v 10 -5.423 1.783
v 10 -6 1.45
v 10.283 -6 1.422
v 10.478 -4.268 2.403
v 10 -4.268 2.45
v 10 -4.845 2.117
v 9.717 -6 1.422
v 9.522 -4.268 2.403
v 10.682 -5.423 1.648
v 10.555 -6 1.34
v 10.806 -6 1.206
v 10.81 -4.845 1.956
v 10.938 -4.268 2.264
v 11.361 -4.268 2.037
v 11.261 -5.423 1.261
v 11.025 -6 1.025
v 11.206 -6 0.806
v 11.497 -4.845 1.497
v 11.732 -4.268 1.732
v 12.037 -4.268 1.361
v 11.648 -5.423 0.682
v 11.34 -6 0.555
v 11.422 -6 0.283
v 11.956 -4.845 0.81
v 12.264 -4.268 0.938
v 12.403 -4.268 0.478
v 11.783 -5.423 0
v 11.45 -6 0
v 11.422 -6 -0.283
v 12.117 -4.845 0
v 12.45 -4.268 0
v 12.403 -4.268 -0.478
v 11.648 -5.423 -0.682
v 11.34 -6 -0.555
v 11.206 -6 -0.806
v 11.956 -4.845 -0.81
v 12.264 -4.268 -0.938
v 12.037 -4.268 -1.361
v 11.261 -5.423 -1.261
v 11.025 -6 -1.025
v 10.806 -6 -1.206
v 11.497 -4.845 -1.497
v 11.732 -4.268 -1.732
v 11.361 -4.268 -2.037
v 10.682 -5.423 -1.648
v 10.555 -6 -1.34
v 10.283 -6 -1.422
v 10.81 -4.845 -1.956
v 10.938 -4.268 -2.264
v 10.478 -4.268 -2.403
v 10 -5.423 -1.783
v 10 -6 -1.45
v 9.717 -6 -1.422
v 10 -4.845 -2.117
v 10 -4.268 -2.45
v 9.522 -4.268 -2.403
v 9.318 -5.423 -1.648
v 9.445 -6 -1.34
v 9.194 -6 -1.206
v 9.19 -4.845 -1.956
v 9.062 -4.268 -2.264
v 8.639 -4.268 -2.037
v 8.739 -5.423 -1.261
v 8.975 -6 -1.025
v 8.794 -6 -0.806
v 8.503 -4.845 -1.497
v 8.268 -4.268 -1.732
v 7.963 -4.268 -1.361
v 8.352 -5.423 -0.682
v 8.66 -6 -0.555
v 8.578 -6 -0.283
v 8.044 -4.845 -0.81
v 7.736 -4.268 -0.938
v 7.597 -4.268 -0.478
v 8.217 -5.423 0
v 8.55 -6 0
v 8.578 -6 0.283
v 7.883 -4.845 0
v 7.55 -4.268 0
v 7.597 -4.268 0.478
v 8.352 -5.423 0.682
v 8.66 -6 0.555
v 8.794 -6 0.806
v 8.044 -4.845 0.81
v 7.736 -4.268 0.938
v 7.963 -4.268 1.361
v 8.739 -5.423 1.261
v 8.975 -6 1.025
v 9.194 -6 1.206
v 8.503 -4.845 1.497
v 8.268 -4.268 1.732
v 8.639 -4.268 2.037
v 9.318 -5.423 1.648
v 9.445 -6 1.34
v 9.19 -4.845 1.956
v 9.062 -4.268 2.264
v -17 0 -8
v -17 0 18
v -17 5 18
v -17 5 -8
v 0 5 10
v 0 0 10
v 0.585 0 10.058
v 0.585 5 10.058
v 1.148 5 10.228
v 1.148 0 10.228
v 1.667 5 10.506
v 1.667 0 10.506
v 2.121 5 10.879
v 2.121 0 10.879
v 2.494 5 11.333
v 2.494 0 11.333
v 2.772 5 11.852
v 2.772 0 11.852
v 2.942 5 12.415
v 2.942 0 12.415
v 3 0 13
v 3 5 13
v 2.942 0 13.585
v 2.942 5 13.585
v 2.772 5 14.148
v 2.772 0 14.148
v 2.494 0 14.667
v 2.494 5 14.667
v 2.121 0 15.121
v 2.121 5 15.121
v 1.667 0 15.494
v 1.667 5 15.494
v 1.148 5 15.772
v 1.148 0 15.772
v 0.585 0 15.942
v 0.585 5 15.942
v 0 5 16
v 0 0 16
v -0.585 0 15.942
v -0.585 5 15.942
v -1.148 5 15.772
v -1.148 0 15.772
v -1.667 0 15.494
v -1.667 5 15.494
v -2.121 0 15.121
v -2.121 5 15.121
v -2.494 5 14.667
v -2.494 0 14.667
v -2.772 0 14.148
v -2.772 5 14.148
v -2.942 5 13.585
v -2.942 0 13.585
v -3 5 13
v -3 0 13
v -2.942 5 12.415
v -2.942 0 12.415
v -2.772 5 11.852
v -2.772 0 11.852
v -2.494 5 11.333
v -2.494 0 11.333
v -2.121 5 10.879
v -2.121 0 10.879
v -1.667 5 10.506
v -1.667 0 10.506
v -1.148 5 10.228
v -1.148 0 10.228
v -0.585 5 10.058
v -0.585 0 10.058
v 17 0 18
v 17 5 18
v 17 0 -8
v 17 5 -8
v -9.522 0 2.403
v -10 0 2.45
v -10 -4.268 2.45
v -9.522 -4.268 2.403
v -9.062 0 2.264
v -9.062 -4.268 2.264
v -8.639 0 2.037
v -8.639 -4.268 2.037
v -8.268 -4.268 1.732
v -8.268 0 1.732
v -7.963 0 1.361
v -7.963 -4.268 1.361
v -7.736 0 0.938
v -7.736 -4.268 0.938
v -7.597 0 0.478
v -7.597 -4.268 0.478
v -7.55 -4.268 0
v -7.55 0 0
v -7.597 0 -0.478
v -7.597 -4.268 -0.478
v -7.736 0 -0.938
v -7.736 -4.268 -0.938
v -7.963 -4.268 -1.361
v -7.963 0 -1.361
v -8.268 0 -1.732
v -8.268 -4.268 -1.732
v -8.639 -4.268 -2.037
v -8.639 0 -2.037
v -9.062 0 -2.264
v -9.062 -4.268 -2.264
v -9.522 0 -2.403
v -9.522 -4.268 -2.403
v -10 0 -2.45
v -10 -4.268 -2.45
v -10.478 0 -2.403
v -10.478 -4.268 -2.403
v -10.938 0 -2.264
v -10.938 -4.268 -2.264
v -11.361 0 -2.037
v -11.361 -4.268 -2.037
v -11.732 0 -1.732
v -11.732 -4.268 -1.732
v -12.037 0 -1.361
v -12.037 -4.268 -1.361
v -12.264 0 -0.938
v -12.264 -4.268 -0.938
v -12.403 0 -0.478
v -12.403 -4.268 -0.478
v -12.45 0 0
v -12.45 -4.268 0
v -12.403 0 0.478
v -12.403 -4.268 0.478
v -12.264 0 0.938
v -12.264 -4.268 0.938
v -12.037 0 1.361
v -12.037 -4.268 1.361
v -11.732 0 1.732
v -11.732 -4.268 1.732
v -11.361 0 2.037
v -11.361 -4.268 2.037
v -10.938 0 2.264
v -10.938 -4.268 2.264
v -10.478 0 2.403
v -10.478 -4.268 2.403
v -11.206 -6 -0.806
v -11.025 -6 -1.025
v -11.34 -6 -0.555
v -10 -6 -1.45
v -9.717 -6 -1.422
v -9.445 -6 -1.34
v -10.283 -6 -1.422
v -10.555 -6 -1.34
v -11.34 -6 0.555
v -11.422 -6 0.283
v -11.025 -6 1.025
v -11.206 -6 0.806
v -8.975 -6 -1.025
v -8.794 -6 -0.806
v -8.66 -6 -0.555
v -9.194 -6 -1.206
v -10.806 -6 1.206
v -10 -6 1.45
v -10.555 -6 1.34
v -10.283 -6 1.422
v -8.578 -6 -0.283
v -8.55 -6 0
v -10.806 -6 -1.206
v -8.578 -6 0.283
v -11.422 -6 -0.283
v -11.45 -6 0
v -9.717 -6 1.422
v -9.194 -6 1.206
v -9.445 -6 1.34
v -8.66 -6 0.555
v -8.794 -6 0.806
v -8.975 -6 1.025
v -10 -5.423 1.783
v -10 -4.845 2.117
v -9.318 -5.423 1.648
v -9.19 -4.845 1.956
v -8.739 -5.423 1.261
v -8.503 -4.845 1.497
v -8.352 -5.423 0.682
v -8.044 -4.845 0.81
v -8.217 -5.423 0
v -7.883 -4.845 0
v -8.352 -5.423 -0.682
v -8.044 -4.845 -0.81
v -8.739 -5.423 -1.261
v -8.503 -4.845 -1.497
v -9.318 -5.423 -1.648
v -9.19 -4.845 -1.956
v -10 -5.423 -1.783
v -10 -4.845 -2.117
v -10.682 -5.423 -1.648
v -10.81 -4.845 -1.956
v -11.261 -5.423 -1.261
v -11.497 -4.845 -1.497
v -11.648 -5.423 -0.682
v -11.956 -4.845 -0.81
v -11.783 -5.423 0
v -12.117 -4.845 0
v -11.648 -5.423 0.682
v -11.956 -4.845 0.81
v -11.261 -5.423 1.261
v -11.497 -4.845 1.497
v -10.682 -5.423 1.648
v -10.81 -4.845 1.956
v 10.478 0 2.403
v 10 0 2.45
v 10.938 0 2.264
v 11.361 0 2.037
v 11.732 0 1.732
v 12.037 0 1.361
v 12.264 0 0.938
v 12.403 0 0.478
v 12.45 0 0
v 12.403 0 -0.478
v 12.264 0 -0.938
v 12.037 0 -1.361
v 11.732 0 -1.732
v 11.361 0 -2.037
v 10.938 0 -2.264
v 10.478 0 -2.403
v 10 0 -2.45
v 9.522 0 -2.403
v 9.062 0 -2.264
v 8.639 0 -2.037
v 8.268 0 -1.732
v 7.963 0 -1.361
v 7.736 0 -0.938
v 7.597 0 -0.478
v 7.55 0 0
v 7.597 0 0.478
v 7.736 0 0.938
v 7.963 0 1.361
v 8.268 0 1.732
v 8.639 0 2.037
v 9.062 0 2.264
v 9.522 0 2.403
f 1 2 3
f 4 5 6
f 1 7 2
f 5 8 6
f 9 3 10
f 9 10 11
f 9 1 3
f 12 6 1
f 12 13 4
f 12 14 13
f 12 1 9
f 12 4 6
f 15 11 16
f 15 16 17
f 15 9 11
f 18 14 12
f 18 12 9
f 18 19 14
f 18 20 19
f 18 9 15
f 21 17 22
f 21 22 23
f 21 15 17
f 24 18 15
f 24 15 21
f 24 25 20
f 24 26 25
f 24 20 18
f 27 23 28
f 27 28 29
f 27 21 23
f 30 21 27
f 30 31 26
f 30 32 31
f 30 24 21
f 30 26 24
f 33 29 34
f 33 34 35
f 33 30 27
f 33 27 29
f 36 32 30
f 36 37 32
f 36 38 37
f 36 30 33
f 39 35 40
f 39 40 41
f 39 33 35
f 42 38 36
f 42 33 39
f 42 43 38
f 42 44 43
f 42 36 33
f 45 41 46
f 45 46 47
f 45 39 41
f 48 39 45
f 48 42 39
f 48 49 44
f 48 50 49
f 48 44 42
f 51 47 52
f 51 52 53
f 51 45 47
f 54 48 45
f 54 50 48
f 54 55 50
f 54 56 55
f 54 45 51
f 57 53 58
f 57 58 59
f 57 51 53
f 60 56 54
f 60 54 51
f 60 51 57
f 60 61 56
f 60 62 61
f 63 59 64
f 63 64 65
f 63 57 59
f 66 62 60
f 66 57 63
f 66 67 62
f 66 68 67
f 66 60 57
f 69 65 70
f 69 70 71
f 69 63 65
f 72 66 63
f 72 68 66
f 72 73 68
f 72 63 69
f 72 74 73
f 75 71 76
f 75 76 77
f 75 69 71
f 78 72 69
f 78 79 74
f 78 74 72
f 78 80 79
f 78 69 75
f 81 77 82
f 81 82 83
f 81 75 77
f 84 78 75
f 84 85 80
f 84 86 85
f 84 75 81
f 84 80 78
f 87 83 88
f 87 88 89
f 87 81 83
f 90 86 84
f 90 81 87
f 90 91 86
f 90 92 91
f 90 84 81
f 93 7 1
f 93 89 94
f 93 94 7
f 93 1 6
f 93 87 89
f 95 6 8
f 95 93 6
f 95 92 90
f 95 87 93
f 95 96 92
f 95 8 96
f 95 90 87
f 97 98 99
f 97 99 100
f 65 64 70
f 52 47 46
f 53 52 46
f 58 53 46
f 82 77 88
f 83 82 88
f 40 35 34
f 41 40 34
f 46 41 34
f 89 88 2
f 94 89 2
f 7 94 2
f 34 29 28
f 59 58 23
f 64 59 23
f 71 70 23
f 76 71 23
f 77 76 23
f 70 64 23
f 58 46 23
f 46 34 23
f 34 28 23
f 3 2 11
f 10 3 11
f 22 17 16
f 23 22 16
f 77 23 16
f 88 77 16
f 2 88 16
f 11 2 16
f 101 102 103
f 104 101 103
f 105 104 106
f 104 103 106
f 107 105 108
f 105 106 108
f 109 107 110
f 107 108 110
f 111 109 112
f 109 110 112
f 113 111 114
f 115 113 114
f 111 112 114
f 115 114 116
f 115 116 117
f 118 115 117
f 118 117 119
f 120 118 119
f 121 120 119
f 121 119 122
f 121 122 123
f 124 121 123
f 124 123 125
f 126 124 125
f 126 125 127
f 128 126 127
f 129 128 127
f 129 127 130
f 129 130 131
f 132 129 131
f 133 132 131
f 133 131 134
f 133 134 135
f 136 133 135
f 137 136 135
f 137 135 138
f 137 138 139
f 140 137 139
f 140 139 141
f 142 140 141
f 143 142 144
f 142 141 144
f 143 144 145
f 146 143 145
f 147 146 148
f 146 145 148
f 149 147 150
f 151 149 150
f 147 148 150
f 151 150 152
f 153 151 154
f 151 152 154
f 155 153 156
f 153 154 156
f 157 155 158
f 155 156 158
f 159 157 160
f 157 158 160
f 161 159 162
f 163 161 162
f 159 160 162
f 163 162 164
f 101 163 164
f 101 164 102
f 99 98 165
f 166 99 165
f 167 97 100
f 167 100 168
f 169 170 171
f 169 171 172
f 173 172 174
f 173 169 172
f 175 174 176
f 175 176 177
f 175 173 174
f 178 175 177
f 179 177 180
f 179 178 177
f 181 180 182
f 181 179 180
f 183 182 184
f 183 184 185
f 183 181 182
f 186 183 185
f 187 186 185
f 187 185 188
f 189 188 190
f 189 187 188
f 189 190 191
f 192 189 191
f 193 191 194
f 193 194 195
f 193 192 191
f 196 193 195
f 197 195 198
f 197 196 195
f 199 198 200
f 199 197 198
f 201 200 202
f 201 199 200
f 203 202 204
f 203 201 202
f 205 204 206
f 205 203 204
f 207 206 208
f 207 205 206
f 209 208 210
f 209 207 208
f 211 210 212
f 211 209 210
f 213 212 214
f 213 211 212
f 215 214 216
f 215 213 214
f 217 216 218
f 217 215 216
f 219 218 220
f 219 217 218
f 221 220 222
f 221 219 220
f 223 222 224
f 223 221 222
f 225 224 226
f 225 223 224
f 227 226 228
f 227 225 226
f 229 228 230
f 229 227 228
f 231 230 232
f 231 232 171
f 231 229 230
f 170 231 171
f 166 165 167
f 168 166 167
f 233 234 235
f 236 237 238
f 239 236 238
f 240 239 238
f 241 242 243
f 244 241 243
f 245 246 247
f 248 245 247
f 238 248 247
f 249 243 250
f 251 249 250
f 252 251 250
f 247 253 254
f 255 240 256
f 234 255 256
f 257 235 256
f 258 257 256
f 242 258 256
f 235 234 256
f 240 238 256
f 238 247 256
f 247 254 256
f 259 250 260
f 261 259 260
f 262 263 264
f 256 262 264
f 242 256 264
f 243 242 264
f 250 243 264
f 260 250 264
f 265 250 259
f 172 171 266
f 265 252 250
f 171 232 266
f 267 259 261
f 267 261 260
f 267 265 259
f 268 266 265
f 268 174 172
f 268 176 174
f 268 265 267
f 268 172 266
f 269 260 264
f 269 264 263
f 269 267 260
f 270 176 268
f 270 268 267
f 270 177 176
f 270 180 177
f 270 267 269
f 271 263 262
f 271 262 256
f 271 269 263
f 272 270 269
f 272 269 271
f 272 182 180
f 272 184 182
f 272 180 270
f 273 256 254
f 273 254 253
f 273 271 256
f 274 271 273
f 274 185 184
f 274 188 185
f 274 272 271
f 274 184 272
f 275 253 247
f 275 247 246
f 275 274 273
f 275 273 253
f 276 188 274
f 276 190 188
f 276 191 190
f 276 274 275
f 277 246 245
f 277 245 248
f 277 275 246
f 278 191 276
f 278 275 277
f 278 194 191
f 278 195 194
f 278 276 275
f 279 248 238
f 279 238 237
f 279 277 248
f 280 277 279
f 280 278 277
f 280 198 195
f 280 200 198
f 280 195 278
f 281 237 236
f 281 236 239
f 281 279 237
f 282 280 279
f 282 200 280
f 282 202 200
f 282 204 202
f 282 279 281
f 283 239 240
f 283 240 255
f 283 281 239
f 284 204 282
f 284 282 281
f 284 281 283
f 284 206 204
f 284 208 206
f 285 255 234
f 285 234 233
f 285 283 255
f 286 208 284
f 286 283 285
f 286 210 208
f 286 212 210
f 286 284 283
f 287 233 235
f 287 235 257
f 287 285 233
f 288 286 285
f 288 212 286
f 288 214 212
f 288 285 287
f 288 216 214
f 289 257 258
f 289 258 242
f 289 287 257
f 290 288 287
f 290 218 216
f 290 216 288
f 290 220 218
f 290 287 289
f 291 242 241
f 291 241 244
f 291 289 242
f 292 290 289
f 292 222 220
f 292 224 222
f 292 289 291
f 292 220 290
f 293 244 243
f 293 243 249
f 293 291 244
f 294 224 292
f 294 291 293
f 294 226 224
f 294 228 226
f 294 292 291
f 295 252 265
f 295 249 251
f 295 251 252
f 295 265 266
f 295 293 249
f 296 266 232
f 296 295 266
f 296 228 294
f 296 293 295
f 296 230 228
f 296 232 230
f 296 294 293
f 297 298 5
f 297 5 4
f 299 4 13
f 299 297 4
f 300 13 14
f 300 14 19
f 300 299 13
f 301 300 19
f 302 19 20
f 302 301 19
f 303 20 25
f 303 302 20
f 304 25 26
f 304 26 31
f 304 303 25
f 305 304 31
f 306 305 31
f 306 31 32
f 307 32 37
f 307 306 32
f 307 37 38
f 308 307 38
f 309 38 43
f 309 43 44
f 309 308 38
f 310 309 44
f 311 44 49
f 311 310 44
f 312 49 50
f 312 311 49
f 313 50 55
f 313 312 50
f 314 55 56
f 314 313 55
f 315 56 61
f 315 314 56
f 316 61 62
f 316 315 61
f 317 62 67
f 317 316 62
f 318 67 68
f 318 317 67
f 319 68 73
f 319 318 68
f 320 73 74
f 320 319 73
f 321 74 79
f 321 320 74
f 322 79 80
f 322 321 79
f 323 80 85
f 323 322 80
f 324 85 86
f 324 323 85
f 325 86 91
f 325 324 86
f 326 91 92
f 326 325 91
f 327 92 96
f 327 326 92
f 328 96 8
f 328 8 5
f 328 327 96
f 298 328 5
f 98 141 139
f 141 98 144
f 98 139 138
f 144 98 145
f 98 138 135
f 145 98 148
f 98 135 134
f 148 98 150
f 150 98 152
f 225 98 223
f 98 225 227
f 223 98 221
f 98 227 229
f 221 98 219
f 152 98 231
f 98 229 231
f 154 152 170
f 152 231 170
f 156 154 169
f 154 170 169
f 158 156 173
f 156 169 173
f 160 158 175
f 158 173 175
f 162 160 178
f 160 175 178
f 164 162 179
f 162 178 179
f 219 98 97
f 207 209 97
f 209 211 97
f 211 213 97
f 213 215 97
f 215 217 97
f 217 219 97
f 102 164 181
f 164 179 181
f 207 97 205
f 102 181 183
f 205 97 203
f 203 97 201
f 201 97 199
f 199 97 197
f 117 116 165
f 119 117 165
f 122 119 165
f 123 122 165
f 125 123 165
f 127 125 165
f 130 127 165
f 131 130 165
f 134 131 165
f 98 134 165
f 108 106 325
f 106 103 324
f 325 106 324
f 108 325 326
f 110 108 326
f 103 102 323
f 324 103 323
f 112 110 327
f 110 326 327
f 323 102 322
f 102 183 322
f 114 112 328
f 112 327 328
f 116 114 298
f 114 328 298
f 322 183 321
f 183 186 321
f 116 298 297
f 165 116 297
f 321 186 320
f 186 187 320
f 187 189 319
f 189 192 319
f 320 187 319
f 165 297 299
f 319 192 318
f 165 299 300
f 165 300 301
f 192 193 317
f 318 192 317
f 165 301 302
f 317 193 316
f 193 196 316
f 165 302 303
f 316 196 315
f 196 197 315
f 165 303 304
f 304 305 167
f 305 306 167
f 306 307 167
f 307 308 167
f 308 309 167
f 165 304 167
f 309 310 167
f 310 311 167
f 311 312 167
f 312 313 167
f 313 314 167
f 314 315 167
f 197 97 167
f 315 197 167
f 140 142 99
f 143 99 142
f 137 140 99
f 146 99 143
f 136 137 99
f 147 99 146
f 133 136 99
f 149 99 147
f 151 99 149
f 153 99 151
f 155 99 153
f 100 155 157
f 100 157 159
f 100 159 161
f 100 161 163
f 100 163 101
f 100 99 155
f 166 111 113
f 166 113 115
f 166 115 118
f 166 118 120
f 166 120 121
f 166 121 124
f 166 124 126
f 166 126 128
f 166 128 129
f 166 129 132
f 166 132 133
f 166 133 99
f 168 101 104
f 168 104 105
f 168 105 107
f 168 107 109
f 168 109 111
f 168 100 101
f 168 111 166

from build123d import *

# Parameters (mm, degrees)
SKETCH1_R             = 2.45
BOSS_EXTRUDE1_DEPTH   = 6
BOSS_EXTRUDE1_2_DEPTH = 6
CHAMFER1_SIZE         = 1
CHAMFER1_SIZE2        = 1.732050808
CHAMFER2_SIZE         = 1
CHAMFER2_SIZE2        = 1.732050808
SKETCH3_W             = 34
SKETCH3_H             = 26
BOSS_EXTRUDE2_DEPTH   = 5
SKETCH6_R             = 3
CUT_EXTRUDE2_DEPTH    = 26.475478406


with BuildPart() as part:
    # Sketch1 → Boss-Extrude1 (new body)
    with BuildSketch(Plane(origin=(0, 0, 0), x_dir=(1, 0, 0), z_dir=(0, 1, 0))):
        with Locations(Location((-10, 0, 0), (0, 0, 270))):
            Circle(SKETCH1_R)
    extrude(amount=-BOSS_EXTRUDE1_DEPTH)

    # Chamfer2
    chamfer2_edges = [part.edges().sort_by_distance(p)[0] for p in [
        (-10, -6, -2.45),
    ]]
    chamfer2_side = [part.faces().sort_by_distance(p)[0] for p in [
        (-10, -6, 0),
    ]]
    chamfer(chamfer2_edges, length=CHAMFER2_SIZE, length2=CHAMFER2_SIZE2, reference=chamfer2_side[0])



with BuildPart() as body_2:
    # Sketch1 → Boss-Extrude1 2 (new body)
    with BuildSketch(Plane(origin=(0, 0, 0), x_dir=(1, 0, 0), z_dir=(0, 1, 0))):
        with Locations(Location((10, 0, 0), (0, 0, 270))):
            Circle(SKETCH1_R)
    extrude(amount=-BOSS_EXTRUDE1_2_DEPTH)

    # Chamfer1
    chamfer1_edges = [body_2.edges().sort_by_distance(p)[0] for p in [
        (10, -6, -2.45),
    ]]
    chamfer1_side = [body_2.faces().sort_by_distance(p)[0] for p in [
        (10, -6, 0),
    ]]
    chamfer(chamfer1_edges, length=CHAMFER1_SIZE, length2=CHAMFER1_SIZE2, reference=chamfer1_side[0])


with BuildPart() as part_1:
    add(part.part)

    add(body_2.part)  # Boss-Extrude2 merges body 2
    # Sketch3 → Boss-Extrude2 (add)
    with BuildSketch(Plane(origin=(0, 0, 0), x_dir=(1, 0, 0), z_dir=(0, 1, 0))):
        with Locations((0, -5)):
            Rectangle(SKETCH3_W, SKETCH3_H)
    extrude(amount=BOSS_EXTRUDE2_DEPTH)

    # Sketch6 → Cut-Extrude2 (cut, through all)
    with BuildSketch(Plane.XZ):
        with Locations(Location((0, 13, 0), (0, 0, 270))):
            Circle(SKETCH6_R)
    extrude(amount=-CUT_EXTRUDE2_DEPTH, mode=Mode.SUBTRACT)


solid = part_1.part
